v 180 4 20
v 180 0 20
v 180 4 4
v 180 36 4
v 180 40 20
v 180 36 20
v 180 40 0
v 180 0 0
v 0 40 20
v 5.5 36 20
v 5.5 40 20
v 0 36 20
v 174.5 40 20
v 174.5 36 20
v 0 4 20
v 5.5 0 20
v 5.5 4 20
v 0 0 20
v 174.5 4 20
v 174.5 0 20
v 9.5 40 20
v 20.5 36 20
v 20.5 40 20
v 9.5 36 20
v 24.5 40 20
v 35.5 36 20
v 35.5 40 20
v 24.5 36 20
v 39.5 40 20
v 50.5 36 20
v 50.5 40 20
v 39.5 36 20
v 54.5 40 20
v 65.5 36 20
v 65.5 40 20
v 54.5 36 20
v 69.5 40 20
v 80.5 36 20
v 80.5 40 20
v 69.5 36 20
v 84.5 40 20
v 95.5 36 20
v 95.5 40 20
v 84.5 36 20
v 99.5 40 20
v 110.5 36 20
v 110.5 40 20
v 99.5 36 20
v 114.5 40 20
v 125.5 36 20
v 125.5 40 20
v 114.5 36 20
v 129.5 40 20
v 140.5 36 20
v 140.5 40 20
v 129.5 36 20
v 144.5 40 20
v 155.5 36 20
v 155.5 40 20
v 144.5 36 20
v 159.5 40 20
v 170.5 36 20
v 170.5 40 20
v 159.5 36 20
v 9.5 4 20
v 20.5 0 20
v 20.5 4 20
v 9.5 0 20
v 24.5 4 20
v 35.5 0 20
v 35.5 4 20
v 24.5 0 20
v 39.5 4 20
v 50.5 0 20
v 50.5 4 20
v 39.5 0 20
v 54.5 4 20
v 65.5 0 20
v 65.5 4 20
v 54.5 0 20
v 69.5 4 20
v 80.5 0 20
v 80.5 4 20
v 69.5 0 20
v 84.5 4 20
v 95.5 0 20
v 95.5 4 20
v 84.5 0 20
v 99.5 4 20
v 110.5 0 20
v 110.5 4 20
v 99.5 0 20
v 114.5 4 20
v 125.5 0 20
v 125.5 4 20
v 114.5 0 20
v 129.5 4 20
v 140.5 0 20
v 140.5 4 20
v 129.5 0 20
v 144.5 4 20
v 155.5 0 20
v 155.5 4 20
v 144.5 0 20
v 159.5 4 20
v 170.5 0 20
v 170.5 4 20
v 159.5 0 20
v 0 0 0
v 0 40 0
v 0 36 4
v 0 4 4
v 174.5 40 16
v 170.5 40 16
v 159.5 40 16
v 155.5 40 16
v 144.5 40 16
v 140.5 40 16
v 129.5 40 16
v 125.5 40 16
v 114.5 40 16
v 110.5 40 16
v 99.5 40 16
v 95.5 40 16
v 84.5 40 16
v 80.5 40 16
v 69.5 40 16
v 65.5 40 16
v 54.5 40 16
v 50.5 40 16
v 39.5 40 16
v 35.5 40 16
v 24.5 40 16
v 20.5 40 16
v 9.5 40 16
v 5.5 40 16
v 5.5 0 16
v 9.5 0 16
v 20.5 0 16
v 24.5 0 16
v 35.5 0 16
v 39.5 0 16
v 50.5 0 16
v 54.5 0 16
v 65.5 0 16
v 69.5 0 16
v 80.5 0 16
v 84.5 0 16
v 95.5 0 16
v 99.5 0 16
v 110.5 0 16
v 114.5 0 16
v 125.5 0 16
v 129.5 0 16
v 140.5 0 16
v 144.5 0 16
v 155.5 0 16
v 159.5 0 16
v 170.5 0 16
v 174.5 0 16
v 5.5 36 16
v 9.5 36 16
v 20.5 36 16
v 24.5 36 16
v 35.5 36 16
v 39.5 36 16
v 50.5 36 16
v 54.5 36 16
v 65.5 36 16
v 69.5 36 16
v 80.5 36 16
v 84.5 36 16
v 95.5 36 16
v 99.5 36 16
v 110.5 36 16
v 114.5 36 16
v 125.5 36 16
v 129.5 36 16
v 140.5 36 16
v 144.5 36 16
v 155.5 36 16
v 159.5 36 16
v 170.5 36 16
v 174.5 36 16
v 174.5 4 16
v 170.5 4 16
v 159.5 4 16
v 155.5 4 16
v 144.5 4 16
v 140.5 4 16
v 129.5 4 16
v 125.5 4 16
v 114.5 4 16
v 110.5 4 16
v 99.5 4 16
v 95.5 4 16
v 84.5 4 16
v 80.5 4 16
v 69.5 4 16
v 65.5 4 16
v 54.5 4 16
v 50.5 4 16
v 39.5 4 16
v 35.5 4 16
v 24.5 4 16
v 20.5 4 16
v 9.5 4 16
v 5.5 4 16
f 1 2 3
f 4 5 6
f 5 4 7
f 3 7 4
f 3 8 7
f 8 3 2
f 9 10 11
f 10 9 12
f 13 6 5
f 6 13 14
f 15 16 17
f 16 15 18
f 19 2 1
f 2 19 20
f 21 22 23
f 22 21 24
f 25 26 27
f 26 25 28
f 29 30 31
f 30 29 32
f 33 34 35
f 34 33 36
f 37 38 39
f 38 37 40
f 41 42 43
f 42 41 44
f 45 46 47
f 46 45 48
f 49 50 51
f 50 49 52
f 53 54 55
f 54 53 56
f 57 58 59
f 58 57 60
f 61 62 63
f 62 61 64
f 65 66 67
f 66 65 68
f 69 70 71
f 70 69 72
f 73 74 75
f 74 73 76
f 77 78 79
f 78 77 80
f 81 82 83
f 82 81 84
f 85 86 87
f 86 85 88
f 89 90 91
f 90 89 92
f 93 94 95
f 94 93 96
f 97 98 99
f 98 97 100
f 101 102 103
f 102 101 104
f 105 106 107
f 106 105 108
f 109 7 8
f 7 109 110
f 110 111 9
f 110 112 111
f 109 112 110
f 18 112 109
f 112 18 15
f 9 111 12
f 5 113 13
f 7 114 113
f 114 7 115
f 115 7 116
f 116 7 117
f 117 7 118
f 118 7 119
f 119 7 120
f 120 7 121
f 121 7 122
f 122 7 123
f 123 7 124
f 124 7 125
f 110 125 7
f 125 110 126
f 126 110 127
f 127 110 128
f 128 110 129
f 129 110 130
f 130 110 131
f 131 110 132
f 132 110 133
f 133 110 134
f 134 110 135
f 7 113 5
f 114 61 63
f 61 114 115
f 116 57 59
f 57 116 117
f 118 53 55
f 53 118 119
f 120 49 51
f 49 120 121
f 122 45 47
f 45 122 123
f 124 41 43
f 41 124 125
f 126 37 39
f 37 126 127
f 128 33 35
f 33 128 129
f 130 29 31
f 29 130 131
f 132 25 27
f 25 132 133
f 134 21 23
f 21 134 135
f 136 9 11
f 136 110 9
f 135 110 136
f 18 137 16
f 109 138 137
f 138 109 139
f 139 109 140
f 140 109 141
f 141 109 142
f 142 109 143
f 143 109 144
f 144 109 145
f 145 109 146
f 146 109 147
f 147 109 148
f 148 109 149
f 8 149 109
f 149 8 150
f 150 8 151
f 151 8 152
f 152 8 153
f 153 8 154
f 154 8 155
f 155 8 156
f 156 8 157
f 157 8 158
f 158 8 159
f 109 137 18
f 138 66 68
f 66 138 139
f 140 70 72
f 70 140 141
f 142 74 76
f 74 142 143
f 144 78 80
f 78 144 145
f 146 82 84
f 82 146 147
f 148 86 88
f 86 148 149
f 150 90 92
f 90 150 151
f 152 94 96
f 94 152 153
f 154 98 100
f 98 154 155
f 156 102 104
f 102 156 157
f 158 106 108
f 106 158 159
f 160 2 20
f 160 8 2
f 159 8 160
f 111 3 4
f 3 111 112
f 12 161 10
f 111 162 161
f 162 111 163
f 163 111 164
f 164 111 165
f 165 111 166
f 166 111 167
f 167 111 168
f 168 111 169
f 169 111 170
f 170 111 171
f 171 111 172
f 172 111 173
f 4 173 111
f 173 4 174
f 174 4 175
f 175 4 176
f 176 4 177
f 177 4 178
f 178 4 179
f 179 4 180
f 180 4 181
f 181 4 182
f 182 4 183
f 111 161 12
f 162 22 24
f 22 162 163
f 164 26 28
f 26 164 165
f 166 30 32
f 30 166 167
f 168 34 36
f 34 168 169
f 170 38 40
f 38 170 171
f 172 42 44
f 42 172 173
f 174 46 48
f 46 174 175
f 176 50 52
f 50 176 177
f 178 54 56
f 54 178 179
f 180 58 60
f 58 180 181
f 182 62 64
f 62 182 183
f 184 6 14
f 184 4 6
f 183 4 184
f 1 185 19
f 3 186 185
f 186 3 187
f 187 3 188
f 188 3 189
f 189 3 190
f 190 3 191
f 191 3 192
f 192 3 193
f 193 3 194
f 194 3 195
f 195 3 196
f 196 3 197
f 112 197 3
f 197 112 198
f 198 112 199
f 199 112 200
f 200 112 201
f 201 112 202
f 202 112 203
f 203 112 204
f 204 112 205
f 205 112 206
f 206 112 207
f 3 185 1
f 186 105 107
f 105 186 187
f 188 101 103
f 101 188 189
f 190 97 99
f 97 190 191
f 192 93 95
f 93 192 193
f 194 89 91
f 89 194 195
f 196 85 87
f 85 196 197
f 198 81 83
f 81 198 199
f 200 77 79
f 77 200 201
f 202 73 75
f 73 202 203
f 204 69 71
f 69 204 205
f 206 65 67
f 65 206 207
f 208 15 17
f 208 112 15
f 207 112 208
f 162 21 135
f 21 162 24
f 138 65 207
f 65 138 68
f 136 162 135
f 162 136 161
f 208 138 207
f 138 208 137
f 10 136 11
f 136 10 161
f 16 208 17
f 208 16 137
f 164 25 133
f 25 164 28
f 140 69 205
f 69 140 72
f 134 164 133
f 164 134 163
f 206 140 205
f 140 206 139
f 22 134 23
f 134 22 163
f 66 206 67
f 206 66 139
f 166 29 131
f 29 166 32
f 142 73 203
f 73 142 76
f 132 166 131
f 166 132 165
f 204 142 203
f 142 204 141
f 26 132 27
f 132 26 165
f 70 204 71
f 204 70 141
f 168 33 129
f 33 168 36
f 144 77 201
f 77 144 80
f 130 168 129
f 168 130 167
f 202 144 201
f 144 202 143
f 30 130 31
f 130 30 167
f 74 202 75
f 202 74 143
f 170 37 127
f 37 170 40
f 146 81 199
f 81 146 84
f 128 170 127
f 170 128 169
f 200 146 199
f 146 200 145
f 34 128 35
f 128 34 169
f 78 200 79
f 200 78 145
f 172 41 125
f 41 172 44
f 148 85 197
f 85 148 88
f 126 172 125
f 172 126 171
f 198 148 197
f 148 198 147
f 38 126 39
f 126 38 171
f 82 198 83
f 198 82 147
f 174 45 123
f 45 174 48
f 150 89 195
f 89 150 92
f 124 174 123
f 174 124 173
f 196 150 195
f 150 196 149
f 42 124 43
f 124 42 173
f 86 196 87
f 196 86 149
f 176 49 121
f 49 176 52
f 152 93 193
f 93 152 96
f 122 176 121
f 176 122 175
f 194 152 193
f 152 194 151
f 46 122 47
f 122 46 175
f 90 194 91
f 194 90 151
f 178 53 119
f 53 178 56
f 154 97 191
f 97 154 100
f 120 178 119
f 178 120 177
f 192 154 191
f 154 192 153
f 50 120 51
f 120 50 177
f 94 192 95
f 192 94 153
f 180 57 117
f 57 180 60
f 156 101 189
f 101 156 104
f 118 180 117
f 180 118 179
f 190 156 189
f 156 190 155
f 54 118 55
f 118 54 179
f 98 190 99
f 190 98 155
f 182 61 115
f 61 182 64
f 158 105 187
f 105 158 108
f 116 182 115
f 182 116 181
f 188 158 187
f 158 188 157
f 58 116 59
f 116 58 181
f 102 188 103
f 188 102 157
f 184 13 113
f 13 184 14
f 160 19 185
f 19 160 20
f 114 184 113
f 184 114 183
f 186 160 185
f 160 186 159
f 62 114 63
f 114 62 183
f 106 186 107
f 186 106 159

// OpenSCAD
$fn = 32;

// ----------------------------------------------------------------------
// Cable duct: 180 x 40 x 20 mm, 12 fingers
// ----------------------------------------------------------------------

// --- parameters (mm) ---
tray_len = 180;           // duct length, X
tray_w = 40;              // duct width, Y
tray_h = 20;              // duct height, Z
tray_t = 4;               // side wall thickness
floor_t = 4;              // floor thickness
slot_w = 4;               // finger slot width
slot_h = 12;              // finger slot height
fingers = 12;             // number of finger slots per side
pitch = 15;               // finger pitch

module shell() {
  difference() {
    cube([tray_len, tray_w, tray_h]);
    /* open top channel */
    translate([-tray_t - 1, tray_t, floor_t])
      cube([tray_len + 2 * tray_t + 2, tray_w - 2 * tray_t, tray_h + 1]);
  }
}

difference() {
  union() {
    shell();
  }
  /* finger slots cut through both side walls */
  for (i = [0 : fingers - 1]) translate([pitch / 2 + i * pitch - slot_w / 2, -1, floor_t + slot_h]) cube([slot_w, tray_w + 2, tray_h]);
}
